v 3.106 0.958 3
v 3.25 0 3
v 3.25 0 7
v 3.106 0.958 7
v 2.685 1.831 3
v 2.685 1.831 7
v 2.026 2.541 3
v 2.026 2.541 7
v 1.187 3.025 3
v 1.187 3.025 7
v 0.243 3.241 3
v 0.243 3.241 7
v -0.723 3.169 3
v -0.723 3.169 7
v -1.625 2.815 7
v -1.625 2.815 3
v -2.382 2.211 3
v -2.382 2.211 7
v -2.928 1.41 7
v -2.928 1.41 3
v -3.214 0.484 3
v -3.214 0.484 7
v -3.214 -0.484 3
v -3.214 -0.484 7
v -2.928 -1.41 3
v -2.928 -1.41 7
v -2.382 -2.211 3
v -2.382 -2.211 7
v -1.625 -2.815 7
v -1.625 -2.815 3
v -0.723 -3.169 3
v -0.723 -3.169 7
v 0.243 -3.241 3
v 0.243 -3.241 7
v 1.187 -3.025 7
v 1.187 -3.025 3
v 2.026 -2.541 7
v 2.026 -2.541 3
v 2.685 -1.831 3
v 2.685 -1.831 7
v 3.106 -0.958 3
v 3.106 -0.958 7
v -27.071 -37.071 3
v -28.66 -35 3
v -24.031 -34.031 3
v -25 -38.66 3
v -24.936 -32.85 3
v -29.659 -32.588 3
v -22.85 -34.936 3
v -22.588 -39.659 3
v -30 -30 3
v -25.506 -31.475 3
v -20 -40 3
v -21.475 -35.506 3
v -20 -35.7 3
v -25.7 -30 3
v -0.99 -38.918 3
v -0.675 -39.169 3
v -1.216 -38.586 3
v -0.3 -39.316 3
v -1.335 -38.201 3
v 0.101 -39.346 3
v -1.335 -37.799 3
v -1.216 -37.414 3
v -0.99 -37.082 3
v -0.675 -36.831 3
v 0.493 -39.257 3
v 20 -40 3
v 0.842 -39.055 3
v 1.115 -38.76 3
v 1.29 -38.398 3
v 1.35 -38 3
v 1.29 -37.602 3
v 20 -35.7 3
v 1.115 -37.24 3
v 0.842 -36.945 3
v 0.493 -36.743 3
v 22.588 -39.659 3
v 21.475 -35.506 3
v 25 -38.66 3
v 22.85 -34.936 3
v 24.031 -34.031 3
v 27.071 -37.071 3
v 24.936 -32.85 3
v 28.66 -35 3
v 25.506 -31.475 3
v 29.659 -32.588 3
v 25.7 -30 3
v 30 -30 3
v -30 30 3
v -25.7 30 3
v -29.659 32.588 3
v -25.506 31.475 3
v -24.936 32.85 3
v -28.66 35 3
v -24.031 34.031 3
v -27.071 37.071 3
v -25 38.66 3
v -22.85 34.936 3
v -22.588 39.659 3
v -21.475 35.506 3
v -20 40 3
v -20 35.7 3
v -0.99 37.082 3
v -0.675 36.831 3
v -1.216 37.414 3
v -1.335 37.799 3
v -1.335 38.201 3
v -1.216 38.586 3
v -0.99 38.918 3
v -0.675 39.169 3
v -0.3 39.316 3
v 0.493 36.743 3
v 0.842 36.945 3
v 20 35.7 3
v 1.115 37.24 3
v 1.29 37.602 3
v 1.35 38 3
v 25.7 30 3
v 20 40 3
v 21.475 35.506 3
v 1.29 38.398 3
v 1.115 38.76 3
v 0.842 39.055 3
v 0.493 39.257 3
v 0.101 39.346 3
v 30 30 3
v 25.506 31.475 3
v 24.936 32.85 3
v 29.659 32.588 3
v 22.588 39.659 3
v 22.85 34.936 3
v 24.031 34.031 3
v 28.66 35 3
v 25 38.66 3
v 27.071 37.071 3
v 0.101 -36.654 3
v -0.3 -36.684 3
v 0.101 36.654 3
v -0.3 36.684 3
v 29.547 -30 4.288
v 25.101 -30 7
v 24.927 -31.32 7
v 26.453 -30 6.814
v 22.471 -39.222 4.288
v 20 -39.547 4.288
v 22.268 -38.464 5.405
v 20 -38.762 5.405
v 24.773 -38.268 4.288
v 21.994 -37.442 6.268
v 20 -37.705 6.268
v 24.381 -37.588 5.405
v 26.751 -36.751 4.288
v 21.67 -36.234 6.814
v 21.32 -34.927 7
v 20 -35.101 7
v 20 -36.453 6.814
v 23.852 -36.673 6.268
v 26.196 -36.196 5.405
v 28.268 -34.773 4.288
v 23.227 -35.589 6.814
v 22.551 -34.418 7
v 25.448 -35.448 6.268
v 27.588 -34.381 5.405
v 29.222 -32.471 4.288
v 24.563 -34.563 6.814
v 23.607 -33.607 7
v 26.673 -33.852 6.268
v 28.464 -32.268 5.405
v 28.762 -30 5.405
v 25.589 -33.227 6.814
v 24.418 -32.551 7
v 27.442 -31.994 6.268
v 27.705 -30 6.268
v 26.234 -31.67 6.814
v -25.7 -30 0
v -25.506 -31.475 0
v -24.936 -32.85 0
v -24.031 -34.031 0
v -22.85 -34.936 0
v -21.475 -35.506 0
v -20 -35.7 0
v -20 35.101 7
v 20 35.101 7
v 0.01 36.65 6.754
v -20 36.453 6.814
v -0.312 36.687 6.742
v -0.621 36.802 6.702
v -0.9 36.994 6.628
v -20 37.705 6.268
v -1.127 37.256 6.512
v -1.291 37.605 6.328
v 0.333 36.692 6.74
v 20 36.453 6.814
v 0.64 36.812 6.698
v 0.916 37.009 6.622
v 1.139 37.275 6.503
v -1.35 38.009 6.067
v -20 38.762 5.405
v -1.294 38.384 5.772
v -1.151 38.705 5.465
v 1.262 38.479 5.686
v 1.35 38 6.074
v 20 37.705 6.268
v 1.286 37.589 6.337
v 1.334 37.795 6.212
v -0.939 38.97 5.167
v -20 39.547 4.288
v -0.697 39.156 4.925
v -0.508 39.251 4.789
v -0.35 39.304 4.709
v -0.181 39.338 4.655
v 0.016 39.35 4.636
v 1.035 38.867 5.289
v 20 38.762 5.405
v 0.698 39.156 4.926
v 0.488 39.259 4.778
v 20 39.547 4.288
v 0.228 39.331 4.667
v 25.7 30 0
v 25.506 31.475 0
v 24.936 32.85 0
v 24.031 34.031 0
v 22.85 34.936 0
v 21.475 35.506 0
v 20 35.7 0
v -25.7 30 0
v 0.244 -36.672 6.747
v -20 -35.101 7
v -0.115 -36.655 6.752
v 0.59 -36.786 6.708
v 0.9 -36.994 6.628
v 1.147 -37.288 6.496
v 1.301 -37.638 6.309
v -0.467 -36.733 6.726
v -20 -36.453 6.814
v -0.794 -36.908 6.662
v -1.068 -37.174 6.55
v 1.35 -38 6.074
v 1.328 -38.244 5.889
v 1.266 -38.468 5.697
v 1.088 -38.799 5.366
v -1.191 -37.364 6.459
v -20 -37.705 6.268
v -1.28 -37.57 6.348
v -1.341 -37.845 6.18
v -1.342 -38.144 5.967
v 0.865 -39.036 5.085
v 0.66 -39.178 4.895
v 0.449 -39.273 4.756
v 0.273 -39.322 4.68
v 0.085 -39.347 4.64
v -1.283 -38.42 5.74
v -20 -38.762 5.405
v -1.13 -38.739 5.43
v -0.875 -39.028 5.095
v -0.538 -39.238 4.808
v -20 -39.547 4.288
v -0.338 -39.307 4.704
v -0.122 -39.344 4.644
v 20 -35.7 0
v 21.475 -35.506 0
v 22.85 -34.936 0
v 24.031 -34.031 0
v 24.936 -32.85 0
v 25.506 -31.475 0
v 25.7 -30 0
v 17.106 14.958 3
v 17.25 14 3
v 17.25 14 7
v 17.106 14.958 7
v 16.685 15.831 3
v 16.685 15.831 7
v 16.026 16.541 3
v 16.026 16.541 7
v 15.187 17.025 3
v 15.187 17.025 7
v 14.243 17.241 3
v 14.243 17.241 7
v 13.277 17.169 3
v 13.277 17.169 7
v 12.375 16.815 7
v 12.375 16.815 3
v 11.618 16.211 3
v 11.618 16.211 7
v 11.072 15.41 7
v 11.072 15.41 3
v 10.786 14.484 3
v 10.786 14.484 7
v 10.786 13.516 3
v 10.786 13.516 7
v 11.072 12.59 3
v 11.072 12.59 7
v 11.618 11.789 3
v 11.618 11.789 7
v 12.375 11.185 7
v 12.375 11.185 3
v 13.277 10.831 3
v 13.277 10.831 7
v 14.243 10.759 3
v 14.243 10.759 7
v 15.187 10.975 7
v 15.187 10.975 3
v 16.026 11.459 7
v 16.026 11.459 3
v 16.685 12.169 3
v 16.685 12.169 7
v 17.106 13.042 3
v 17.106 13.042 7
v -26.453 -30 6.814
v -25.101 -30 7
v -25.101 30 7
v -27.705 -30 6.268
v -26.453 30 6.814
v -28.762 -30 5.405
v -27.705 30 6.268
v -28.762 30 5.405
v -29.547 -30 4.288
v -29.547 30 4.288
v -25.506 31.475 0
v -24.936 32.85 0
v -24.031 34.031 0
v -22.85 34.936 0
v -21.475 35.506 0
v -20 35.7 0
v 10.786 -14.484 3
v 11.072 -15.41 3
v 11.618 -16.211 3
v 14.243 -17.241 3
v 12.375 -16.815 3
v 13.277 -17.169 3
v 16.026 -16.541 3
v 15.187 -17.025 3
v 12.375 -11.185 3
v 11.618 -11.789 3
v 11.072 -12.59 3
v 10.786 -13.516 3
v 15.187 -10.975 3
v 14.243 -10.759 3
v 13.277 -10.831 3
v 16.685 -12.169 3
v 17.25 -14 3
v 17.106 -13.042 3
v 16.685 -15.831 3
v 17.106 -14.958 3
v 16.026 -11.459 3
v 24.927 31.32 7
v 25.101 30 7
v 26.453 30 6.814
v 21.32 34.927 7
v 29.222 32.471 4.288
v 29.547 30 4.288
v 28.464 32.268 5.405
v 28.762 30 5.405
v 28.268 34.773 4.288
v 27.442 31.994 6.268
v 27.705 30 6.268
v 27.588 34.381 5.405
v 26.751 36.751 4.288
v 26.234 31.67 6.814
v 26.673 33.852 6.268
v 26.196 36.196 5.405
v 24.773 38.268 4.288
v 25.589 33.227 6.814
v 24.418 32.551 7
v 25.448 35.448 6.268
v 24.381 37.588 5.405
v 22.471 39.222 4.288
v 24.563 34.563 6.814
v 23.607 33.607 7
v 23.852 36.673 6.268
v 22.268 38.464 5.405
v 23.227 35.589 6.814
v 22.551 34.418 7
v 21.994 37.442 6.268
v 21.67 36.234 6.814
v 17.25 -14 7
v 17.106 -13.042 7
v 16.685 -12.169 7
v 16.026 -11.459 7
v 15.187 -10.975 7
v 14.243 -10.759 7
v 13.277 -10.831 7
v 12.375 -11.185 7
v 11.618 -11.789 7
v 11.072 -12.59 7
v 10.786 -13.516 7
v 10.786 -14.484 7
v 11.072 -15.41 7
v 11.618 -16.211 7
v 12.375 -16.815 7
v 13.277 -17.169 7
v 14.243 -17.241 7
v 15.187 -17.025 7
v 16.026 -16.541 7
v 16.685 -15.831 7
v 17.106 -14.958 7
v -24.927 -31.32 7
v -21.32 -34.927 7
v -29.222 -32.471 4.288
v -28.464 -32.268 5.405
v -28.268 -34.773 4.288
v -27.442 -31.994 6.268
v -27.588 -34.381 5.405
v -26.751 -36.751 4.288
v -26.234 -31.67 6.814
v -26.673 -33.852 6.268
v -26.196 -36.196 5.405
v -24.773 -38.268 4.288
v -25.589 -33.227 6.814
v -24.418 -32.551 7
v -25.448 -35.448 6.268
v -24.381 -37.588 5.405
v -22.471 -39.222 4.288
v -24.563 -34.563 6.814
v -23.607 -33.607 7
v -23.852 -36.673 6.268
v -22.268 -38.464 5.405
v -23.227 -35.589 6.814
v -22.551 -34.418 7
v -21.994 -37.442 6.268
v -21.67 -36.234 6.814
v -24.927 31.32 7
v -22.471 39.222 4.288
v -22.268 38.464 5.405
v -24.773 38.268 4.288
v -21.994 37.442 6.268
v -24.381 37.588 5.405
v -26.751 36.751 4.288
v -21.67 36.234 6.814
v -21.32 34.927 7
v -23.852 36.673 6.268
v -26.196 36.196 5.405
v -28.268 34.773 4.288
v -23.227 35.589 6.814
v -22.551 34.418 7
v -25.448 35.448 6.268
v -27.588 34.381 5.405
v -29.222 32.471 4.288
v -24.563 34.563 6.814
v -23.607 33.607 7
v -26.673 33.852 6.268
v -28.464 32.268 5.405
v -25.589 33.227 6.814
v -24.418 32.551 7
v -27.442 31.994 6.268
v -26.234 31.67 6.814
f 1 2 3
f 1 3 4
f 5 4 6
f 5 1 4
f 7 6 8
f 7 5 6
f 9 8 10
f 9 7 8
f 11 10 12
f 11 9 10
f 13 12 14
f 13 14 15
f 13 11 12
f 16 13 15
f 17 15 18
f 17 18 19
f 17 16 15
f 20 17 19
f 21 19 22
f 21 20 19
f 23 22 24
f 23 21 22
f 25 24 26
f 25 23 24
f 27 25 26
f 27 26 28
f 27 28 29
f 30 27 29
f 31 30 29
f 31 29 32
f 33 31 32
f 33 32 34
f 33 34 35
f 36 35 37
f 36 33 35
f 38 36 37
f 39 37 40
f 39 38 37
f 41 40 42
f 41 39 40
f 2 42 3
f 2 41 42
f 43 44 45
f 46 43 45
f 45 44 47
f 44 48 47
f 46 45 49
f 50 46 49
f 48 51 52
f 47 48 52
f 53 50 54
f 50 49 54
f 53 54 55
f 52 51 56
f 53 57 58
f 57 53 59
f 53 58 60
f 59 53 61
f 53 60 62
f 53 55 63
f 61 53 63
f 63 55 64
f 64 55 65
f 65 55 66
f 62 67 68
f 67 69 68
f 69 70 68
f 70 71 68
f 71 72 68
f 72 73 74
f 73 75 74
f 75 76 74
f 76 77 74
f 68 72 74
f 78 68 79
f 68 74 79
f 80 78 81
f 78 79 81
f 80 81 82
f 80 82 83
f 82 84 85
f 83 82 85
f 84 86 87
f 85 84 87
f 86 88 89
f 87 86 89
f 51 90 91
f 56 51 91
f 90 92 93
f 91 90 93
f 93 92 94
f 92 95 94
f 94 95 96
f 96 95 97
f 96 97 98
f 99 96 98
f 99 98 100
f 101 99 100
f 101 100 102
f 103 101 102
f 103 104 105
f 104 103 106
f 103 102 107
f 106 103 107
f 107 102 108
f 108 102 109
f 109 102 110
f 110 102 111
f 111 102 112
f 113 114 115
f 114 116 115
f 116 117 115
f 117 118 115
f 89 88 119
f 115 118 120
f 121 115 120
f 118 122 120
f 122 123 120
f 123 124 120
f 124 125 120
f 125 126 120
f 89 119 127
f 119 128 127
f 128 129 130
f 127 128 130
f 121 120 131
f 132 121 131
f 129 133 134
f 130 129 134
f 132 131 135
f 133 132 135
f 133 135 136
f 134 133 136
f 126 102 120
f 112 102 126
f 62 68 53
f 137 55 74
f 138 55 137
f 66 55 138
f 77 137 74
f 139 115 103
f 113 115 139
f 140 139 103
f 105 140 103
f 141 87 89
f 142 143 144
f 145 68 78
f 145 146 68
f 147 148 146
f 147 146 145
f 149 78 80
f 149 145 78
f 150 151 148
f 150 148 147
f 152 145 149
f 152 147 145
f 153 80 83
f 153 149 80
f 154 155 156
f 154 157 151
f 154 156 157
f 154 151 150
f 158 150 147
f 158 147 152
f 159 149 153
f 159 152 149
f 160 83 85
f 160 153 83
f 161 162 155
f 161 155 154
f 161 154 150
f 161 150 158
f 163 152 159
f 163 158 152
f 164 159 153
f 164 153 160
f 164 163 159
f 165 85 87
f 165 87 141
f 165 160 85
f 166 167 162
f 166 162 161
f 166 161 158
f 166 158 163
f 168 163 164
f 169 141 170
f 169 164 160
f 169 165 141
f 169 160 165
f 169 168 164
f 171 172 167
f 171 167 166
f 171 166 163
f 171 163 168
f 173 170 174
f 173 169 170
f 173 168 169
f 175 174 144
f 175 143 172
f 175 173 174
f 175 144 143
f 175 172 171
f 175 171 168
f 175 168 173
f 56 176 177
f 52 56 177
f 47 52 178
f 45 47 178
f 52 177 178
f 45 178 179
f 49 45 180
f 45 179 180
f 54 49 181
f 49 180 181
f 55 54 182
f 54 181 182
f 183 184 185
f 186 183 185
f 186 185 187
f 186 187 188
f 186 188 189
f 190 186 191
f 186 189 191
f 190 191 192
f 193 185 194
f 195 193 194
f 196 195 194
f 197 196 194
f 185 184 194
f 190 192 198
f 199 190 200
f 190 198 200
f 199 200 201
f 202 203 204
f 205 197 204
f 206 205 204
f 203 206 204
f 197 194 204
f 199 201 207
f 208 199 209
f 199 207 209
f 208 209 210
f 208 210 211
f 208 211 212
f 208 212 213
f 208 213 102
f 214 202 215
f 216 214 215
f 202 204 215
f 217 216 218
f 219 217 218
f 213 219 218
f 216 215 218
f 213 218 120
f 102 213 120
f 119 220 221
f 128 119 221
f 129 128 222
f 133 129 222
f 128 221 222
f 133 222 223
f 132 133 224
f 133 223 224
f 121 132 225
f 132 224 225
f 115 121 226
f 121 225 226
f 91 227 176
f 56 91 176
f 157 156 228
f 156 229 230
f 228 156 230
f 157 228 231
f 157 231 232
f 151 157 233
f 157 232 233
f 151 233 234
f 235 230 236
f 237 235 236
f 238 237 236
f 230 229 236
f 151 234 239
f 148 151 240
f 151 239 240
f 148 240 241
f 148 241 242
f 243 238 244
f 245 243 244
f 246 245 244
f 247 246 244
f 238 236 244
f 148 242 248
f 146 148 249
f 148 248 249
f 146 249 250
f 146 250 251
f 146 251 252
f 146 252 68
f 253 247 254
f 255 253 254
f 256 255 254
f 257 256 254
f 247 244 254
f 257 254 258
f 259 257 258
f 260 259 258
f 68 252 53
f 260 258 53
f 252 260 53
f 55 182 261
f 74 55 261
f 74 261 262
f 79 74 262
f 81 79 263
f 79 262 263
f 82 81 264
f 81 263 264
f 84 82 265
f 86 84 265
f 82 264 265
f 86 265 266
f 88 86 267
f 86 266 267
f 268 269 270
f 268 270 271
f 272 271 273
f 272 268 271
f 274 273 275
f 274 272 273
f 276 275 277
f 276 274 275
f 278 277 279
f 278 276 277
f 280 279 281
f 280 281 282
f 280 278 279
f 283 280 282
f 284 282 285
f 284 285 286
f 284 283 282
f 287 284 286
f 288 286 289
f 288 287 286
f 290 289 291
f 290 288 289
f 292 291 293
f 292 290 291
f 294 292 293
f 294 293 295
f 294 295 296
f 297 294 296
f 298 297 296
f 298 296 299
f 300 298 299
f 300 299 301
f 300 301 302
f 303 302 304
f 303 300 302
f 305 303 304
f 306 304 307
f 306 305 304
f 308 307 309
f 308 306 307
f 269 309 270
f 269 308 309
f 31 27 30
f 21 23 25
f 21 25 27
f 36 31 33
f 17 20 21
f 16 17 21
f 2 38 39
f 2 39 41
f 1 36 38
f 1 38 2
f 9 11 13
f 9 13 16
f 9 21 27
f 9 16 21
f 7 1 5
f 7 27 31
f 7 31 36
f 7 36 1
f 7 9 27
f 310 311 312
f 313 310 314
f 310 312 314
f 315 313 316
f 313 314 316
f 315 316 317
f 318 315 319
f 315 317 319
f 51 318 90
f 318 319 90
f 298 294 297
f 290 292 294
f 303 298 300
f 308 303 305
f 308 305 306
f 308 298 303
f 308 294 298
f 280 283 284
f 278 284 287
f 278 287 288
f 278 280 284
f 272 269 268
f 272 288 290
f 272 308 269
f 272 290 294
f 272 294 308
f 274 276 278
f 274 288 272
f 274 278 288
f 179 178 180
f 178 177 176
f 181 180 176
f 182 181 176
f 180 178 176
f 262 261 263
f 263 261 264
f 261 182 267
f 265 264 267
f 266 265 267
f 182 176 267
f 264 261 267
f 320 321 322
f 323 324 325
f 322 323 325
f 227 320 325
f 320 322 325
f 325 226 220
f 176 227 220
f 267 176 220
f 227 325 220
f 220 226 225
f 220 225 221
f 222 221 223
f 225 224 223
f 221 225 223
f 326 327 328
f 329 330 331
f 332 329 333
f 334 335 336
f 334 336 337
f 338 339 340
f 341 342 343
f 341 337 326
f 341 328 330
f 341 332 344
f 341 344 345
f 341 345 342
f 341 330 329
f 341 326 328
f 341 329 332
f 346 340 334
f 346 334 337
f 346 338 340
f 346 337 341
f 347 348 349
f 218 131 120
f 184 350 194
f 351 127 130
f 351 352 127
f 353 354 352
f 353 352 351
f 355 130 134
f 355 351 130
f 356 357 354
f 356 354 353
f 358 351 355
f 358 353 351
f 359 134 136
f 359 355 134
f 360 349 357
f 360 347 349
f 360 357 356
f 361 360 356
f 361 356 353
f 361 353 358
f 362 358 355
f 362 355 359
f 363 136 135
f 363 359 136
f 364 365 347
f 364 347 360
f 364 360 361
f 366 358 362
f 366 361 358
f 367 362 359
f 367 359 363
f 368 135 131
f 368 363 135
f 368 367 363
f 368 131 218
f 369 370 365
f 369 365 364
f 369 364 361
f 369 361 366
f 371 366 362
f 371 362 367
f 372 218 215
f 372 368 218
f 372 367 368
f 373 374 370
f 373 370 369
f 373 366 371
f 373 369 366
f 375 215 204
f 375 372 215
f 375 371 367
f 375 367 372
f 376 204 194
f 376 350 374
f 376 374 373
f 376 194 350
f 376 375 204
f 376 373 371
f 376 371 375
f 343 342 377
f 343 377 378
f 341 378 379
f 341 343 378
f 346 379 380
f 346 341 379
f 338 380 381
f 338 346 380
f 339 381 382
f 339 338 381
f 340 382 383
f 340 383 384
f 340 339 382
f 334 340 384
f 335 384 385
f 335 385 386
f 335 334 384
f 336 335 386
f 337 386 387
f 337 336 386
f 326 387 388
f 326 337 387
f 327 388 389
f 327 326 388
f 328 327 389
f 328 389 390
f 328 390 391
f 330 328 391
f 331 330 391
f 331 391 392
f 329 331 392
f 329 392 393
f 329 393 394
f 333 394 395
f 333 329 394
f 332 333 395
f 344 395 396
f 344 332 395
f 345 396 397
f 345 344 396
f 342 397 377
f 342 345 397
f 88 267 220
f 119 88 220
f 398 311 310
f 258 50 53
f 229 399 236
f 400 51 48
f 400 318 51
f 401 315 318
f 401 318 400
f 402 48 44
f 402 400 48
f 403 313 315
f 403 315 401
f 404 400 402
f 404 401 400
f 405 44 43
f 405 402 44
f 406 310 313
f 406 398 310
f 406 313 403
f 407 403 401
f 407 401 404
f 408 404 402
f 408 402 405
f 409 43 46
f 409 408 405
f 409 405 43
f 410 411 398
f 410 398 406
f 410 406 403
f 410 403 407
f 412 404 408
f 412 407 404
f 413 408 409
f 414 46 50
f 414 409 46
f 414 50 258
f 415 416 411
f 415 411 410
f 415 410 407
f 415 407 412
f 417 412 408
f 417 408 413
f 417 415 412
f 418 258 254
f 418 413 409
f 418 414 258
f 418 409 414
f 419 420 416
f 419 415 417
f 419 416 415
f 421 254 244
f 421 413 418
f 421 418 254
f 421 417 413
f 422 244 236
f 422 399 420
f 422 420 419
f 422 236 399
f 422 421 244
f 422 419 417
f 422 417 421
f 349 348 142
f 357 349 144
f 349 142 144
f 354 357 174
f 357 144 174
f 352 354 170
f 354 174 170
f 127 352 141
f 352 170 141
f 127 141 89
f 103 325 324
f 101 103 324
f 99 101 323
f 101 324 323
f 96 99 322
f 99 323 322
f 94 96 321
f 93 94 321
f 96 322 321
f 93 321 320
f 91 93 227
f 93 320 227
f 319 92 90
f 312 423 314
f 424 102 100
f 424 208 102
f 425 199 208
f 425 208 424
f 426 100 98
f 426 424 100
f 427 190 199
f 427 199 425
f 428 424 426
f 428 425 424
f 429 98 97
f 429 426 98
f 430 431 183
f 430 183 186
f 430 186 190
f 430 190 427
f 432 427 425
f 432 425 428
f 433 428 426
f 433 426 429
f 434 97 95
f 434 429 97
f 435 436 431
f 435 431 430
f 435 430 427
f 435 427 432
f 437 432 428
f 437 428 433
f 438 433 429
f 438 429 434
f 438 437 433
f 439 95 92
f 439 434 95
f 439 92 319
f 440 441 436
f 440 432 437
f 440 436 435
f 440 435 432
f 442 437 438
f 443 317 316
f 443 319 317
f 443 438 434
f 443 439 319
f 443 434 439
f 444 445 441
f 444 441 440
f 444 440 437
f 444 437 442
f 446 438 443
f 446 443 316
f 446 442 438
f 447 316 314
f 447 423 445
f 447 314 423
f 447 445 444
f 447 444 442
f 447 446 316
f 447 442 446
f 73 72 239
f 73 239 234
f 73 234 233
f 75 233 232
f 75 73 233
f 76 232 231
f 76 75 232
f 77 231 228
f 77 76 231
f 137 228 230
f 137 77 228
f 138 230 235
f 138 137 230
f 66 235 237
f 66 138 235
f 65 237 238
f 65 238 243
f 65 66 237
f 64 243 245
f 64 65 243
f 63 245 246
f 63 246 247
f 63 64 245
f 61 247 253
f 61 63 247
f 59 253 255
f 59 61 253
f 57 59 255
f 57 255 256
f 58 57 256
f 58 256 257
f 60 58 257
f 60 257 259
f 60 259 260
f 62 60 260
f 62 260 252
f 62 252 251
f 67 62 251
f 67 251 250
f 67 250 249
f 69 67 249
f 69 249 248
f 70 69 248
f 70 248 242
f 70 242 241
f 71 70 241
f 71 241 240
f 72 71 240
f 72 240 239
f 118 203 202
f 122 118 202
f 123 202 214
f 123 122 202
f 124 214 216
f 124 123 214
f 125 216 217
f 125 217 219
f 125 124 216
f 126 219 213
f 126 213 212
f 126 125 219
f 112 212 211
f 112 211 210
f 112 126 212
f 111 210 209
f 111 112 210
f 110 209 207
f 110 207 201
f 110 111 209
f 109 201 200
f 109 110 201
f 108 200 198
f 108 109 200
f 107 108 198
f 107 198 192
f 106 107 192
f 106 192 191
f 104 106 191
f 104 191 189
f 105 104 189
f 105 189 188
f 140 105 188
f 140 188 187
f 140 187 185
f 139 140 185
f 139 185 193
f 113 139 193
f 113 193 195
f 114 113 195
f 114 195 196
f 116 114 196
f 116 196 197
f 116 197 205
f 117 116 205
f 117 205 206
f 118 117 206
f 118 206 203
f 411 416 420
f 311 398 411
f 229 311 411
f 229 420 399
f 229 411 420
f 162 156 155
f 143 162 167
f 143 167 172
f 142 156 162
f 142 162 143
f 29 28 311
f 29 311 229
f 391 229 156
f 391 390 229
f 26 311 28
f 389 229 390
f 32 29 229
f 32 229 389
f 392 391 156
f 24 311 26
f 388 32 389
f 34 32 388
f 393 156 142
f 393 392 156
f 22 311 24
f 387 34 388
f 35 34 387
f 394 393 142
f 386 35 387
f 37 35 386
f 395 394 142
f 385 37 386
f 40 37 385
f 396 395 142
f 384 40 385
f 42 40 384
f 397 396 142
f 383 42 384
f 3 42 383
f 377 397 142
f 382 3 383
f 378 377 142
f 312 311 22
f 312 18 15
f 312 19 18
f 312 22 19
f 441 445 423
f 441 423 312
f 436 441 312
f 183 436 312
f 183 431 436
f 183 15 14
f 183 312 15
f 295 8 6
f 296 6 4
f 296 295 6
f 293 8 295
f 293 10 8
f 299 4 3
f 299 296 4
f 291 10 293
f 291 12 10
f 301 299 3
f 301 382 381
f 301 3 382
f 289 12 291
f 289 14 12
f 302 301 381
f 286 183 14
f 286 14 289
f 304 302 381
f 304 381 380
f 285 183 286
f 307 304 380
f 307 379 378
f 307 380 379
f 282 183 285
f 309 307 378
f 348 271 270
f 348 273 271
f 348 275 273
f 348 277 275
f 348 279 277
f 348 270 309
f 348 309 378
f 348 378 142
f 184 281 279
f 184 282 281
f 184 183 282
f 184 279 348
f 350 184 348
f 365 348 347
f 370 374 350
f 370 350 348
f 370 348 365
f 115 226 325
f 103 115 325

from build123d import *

# Parameters (mm, degrees)
EXTRUDE_1_DEPTH = 3
EXTRUDE_START   = 3
SKETCH_2_R      = 1.35
SKETCH_2_R_2    = 3.25
EXTRUDE_2_DEPTH = 4
FILLET_1_R      = 5


with BuildPart() as part:
    # 草圖1 → 填料-伸長1 (new body)
    with BuildSketch(Plane.XY):
        with BuildLine():
            Line((25.7, -30), (25.7, 30))
            ThreePointArc((25.7, 30), (24.030508653, 34.030508653), (20, 35.7))
            Line((20, 35.7), (-20, 35.7))
            ThreePointArc((-20, 35.7), (-24.030508653, 34.030508653), (-25.7, 30))
            Line((-25.7, 30), (-25.7, -30))
            ThreePointArc((-25.7, -30), (-24.030508653, -34.030508653), (-20, -35.7))
            Line((-20, -35.7), (20, -35.7))
            ThreePointArc((20, -35.7), (24.030508653, -34.030508653), (25.7, -30))
        make_face()
    extrude(amount=EXTRUDE_1_DEPTH)

    # 草圖2 → 填料-伸長2 (add)
    with BuildSketch(Plane.XY.offset(EXTRUDE_START)):
        with BuildLine():
            Line((30, -30), (30, 30))
            ThreePointArc((30, 30), (27.071067812, 37.071067812), (20, 40))
            Line((20, 40), (-20, 40))
            ThreePointArc((-20, 40), (-27.071067812, 37.071067812), (-30, 30))
            Line((-30, 30), (-30, -30))
            ThreePointArc((-30, -30), (-27.071067812, -37.071067812), (-20, -40))
            Line((-20, -40), (20, -40))
            ThreePointArc((20, -40), (27.071067812, -37.071067812), (30, -30))
        make_face()
        with Locations((0, 38)):
            Circle(SKETCH_2_R, mode=Mode.SUBTRACT)
        with Locations((0, -38)):
            Circle(SKETCH_2_R, mode=Mode.SUBTRACT)
        Circle(SKETCH_2_R_2, mode=Mode.SUBTRACT)
        with Locations((14, -14)):
            Circle(SKETCH_2_R_2, mode=Mode.SUBTRACT)
        with Locations((14, 14)):
            Circle(SKETCH_2_R_2, mode=Mode.SUBTRACT)
    extrude(amount=EXTRUDE_2_DEPTH)

    # 圓角1
    # the kernel refuses this fillet: 5 mm, written as the material it takes off along each edge
    with BuildSketch(Plane(origin=(20, -30, 7), x_dir=(0, -1, 0), z_dir=(-1, 0, 0))) as fillet_1_piece_1:
        with BuildLine():
            CenterArc((5.101020514, -5), FILLET_1_R, 11.536959033, 78.463040967)
            Line((5.101020514, 0), (5.101020514, 0.1))
            Line((5.101020514, 0.1), (10, 0.1))
            Line((10, 0.1), (10.1, 0))
            ThreePointArc((10.1, 0), (10.1, -2), (10.09797959, -3.98))
            Line((10.09797959, -3.98), (10, -4))
        make_face()
    revolve(axis=Axis((20, -30, 7), (0, 0, 1)), revolution_arc=90, mode=Mode.SUBTRACT)
    with BuildSketch(Plane(origin=(30, -30, 7), x_dir=(-1.5640821970914211e-12, 0, -1.0), z_dir=(0, 1, 0)), Plane(origin=(-30, 30, 7), x_dir=(1.5640821970914211e-12, 0, -1.0), z_dir=(0, -1, 0))) as fillet_1_piece_2:
        with BuildLine():
            CenterArc((5, 4.898979486), FILLET_1_R, 180, 78.463040967)
            Line((0, 4.898979486), (-0.1, 4.898979486))
            Line((-0.1, 4.898979486), (-0.1, 0))
            Line((-0.1, 0), (0, -0.1))
            ThreePointArc((0, -0.1), (2, -0.1), (3.98, -0.09797959))
            Line((3.98, -0.09797959), (4, 0))
        make_face()
    extrude(amount=60, mode=Mode.SUBTRACT)
    with BuildSketch(Plane(origin=(20, 30, 7), x_dir=(1, 0, 0), z_dir=(0, -1, 0))) as fillet_1_piece_3:
        with BuildLine():
            CenterArc((5.101020514, -5), FILLET_1_R, 11.536959033, 78.463040967)
            Line((5.101020514, 0), (5.101020514, 0.1))
            Line((5.101020514, 0.1), (10, 0.1))
            Line((10, 0.1), (10.1, 0))
            ThreePointArc((10.1, 0), (10.1, -2), (10.09797959, -3.98))
            Line((10.09797959, -3.98), (10, -4))
        make_face()
    revolve(axis=Axis((20, 30, 7), (0, 0, 1)), revolution_arc=90, mode=Mode.SUBTRACT)
    with BuildSketch(Plane(origin=(20, 40, 7), x_dir=(0, -1.5667467323505197e-12, -1.0), z_dir=(-1, 0, 0)), Plane(origin=(-20, -40, 7), x_dir=(0, 1.5667467323505197e-12, -1.0), z_dir=(1, 0, 0))) as fillet_1_piece_4:
        with BuildLine():
            CenterArc((5, 4.898979486), FILLET_1_R, 180, 78.463040967)
            Line((0, 4.898979486), (-0.1, 4.898979486))
            Line((-0.1, 4.898979486), (-0.1, 0))
            Line((-0.1, 0), (0, -0.1))
            ThreePointArc((0, -0.1), (2, -0.1), (3.98, -0.09797959))
            Line((3.98, -0.09797959), (4, 0))
        make_face()
    extrude(amount=40, mode=Mode.SUBTRACT)
    with BuildSketch(Plane(origin=(-20, 30, 7), x_dir=(0, 1, 0), z_dir=(1, 0, 0))) as fillet_1_piece_5:
        with BuildLine():
            CenterArc((5.101020514, -5), FILLET_1_R, 11.536959033, 78.463040967)
            Line((5.101020514, 0), (5.101020514, 0.1))
            Line((5.101020514, 0.1), (10, 0.1))
            Line((10, 0.1), (10.1, 0))
            ThreePointArc((10.1, 0), (10.1, -2), (10.09797959, -3.98))
            Line((10.09797959, -3.98), (10, -4))
        make_face()
    revolve(axis=Axis((-20, 30, 7), (0, 0, 1)), revolution_arc=90, mode=Mode.SUBTRACT)
    with BuildSketch(Plane(origin=(-20, -30, 7), x_dir=(-1, 0, 0), z_dir=(0, 1, 0))) as fillet_1_piece_6:
        with BuildLine():
            CenterArc((5.101020514, -5), FILLET_1_R, 11.536959033, 78.463040967)
            Line((5.101020514, 0), (5.101020514, 0.1))
            Line((5.101020514, 0.1), (10, 0.1))
            Line((10, 0.1), (10.1, 0))
            ThreePointArc((10.1, 0), (10.1, -2), (10.09797959, -3.98))
            Line((10.09797959, -3.98), (10, -4))
        make_face()
    revolve(axis=Axis((-20, -30, 7), (0, 0, 1)), revolution_arc=90, mode=Mode.SUBTRACT)


solid = part.part
